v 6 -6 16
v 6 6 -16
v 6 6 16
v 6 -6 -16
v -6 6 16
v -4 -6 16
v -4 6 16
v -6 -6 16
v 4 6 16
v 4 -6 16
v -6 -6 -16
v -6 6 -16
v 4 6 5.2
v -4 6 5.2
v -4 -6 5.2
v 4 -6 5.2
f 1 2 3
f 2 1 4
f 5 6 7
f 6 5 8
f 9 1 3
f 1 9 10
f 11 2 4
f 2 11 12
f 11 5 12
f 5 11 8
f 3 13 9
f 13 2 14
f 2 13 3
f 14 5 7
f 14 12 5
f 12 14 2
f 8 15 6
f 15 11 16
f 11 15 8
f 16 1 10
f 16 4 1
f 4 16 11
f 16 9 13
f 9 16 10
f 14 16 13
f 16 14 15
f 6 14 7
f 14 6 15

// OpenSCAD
size=32; //block=32 //item=8

difference(){
cube([size*0.375,size*0.375,size*1],center=true);	//arm
translate([0,0,size*0.35]){
cube([size*0.25,size*0.5,size*0.375],center=true);	//hinge
};	//translate
};	//difference
